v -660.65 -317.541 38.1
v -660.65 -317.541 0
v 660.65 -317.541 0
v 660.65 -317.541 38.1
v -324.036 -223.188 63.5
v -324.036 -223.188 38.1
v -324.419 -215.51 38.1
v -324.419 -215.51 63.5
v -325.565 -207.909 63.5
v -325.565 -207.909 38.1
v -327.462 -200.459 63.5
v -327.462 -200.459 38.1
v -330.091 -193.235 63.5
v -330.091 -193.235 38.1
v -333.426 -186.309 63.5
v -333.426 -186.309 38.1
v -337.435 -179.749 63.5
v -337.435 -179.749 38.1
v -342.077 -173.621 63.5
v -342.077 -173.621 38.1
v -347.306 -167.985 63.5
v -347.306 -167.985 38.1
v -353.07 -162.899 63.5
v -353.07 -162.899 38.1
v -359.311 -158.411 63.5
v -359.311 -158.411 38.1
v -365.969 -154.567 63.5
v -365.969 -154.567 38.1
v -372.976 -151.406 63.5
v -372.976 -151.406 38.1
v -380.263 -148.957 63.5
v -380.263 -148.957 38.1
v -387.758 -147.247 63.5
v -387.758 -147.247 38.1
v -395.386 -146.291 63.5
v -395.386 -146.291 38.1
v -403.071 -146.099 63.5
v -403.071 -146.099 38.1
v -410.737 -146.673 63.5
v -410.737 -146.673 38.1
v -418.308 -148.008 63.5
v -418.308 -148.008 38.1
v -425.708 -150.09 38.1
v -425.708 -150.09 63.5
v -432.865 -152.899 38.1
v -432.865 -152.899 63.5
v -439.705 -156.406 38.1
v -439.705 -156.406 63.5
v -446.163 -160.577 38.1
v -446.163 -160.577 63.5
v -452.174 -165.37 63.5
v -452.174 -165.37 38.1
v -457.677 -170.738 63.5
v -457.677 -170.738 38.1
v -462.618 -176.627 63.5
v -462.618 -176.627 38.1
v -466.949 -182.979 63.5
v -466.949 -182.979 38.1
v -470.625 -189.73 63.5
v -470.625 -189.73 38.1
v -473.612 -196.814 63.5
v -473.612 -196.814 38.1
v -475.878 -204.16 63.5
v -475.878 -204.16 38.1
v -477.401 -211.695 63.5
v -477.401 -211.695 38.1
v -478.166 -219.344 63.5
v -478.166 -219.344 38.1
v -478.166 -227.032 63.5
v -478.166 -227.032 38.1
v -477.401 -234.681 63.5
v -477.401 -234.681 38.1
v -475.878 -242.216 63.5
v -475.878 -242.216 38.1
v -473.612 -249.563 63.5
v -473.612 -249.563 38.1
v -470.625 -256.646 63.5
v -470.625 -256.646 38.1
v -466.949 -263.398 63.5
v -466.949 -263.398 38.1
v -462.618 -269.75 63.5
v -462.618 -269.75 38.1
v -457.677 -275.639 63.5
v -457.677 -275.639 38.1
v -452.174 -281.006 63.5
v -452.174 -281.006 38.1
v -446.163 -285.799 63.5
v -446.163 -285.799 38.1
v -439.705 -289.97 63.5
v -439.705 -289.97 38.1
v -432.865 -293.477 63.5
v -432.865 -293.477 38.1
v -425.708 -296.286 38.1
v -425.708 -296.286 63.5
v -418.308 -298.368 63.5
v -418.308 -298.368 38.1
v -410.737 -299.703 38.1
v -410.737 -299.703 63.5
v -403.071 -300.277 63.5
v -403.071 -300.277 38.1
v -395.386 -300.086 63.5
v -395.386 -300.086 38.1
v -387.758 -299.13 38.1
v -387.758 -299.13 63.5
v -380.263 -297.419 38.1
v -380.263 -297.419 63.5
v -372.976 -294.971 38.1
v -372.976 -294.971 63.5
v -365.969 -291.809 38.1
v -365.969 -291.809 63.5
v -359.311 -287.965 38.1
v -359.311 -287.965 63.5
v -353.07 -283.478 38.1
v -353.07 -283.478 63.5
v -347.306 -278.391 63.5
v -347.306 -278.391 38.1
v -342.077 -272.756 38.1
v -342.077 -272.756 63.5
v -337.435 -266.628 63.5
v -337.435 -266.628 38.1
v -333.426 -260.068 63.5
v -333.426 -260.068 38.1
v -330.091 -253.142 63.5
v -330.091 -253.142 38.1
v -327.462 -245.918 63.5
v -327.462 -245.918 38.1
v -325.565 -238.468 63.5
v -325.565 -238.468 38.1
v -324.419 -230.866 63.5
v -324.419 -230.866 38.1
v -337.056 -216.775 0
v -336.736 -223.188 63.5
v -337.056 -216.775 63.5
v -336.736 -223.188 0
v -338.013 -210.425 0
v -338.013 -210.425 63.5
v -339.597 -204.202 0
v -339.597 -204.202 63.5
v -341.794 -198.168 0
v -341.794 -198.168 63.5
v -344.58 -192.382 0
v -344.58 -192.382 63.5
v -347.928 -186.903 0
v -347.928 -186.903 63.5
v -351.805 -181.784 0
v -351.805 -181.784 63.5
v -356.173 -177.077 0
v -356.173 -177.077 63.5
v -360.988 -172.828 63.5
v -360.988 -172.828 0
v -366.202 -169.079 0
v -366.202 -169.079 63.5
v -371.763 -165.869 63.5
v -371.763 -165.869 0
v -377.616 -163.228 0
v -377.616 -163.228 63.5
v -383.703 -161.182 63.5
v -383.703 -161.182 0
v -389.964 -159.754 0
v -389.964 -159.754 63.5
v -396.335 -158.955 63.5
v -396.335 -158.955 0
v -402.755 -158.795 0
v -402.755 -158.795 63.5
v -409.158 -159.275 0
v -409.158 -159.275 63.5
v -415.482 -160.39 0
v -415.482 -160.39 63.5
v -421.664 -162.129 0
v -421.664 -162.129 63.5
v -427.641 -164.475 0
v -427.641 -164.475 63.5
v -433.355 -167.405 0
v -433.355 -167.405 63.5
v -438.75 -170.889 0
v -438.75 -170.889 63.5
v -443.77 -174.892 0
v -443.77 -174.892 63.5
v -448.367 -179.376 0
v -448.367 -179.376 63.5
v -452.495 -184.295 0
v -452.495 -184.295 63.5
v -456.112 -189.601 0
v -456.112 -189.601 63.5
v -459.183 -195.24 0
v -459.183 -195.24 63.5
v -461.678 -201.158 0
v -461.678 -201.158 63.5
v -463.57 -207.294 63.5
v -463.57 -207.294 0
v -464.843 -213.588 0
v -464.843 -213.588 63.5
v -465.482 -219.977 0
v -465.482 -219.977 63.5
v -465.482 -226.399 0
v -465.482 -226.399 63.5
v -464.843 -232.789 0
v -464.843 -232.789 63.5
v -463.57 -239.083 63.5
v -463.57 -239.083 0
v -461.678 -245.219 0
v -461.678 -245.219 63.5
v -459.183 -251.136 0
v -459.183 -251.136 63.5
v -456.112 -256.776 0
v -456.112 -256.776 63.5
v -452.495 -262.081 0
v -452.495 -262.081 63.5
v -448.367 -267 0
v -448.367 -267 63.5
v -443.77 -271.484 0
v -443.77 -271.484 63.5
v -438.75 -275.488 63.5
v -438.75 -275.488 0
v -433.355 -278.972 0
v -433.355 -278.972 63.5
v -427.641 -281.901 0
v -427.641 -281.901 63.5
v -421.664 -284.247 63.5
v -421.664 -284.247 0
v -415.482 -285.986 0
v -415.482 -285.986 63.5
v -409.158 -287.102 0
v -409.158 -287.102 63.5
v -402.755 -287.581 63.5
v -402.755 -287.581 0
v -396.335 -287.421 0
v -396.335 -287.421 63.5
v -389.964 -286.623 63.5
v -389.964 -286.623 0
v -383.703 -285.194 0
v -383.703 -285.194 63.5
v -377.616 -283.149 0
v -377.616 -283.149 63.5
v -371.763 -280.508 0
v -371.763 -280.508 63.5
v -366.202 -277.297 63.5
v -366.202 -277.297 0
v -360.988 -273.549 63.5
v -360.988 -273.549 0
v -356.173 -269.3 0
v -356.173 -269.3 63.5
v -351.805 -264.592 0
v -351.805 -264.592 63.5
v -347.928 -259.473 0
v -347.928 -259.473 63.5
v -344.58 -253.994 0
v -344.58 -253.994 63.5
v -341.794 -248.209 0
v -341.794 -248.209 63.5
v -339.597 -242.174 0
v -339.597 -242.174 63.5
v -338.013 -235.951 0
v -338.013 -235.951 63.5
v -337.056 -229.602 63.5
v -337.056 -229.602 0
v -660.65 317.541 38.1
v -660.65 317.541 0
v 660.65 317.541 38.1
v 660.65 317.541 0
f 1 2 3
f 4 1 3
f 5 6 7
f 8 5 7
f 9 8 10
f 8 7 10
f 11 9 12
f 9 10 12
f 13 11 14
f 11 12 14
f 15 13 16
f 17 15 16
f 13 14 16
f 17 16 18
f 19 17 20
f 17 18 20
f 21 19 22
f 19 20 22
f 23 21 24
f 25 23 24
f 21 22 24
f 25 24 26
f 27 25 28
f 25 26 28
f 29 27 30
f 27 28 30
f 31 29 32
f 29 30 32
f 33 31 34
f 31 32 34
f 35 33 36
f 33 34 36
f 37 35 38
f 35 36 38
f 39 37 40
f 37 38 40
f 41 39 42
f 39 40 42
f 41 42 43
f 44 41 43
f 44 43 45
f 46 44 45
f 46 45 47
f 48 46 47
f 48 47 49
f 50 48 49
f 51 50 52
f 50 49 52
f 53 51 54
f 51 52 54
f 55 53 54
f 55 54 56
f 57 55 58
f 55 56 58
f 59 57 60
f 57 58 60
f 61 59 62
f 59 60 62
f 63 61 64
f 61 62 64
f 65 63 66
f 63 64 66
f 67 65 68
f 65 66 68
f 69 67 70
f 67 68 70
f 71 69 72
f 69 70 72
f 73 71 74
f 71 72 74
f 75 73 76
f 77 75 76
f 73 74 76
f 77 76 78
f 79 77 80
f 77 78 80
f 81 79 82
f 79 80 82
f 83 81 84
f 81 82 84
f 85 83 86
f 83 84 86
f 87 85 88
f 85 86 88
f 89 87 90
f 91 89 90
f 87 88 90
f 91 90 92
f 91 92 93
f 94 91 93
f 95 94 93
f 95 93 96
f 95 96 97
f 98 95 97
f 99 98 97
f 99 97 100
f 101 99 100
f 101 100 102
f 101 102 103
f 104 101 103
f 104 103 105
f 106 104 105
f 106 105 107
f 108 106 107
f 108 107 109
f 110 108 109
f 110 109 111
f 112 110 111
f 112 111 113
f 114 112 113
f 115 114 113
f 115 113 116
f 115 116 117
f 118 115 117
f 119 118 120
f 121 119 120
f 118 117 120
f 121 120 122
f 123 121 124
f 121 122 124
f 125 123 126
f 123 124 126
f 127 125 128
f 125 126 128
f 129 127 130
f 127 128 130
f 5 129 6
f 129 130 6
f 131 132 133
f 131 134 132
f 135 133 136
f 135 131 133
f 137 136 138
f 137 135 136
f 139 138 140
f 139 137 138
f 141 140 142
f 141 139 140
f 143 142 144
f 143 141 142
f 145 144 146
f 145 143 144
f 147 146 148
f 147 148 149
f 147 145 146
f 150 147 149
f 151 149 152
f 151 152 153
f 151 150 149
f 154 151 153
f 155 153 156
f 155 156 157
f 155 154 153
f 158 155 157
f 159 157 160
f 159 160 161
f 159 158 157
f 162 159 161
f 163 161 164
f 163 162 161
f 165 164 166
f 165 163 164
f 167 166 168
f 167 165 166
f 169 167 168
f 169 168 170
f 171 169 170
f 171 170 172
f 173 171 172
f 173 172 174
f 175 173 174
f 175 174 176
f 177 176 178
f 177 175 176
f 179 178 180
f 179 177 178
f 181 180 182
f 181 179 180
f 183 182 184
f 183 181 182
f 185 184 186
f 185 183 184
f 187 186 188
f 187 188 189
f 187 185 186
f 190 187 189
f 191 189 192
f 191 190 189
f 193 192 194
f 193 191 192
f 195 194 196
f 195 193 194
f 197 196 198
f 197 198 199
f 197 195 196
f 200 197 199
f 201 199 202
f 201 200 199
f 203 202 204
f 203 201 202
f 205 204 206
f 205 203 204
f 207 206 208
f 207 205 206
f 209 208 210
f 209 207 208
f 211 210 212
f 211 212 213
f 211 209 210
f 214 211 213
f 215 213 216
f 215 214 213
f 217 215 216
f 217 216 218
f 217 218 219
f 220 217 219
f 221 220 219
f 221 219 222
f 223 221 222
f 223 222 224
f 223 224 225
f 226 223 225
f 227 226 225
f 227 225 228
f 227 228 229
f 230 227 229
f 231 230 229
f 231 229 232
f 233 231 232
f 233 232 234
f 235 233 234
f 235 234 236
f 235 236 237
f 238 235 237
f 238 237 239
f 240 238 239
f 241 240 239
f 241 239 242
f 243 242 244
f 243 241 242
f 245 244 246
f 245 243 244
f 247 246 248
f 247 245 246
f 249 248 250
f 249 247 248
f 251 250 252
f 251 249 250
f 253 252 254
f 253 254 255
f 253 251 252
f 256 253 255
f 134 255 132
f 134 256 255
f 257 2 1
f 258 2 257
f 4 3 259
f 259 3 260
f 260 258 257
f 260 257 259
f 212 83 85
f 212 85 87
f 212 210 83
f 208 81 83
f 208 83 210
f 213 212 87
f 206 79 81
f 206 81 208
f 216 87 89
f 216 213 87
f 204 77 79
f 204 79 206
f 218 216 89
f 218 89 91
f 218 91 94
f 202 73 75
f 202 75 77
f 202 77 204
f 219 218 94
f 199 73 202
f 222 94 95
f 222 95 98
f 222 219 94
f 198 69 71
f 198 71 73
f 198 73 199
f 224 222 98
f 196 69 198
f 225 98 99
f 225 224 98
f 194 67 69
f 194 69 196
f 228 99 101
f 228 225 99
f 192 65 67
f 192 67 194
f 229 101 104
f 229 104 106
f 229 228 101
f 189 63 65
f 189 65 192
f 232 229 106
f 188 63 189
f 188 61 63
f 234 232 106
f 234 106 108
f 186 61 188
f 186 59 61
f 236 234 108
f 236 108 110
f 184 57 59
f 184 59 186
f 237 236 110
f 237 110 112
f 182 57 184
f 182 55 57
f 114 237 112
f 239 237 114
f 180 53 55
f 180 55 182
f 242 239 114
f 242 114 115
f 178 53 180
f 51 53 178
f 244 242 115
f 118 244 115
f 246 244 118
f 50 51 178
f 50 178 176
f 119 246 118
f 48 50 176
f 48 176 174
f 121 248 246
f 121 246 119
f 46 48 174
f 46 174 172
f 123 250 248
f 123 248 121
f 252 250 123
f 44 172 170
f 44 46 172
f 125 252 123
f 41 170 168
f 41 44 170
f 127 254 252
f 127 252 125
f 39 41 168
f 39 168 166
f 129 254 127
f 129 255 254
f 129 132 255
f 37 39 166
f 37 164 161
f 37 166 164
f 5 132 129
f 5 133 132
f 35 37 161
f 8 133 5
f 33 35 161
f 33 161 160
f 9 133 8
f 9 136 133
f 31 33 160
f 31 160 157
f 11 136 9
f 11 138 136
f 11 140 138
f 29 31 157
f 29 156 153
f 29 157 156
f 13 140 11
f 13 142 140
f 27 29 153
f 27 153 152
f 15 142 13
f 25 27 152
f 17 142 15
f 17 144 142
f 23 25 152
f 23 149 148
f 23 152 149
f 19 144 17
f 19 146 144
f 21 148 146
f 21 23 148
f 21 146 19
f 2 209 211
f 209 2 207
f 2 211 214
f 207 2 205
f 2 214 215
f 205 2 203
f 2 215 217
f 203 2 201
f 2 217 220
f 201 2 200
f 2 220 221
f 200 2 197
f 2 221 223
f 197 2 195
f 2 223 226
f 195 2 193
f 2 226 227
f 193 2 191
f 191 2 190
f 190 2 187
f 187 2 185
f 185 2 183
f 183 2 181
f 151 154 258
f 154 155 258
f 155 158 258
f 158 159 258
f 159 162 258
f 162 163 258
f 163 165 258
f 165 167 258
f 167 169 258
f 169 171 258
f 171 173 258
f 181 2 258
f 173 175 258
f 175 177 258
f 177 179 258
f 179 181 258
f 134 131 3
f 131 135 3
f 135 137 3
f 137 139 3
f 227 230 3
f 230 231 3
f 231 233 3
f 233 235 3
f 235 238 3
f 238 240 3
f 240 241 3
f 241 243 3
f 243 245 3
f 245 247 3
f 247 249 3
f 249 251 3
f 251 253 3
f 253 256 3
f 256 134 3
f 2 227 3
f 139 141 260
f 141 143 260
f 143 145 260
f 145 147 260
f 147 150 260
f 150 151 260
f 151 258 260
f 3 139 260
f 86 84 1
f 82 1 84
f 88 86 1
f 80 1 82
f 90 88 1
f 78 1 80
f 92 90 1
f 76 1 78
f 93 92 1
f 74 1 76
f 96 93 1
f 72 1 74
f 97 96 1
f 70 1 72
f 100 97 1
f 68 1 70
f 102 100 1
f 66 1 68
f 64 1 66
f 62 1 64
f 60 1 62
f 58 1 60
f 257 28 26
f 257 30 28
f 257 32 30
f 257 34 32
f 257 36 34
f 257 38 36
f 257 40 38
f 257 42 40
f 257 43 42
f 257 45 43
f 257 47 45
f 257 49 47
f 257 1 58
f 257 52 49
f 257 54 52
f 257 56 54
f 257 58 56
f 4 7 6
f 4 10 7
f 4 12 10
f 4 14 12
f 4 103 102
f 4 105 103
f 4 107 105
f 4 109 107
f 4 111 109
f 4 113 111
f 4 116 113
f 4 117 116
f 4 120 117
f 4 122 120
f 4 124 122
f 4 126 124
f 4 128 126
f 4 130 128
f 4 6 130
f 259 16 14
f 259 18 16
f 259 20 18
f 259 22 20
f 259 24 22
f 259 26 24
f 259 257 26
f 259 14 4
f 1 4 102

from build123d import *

# Parameters (mm, degrees)
F0_W     = 1321.300506
F0_H     = 635.08135
F0_R     = 64.413244
F1_DEPTH = 38.1
F2_R     = 77.113234
F2_R_2   = 64.413244
F3_DEPTH = 25.4


with BuildPart() as f1:
    # F0 (on Top) → F1 (new body)
    with BuildSketch(Plane.XY):
        Rectangle(F0_W, F0_H)
        with Locations((-401.148856, -223.188221)):
            Circle(F0_R, mode=Mode.SUBTRACT)
    extrude(amount=F1_DEPTH)

    # F2 (on face) → F3 (join)
    with BuildSketch(Plane.XY.offset(38.1)):
        with Locations((-401.148856, -223.188221)):
            Circle(F2_R)
        with Locations((-401.148856, -223.188221)):
            Circle(F2_R_2, mode=Mode.SUBTRACT)
    extrude(amount=F3_DEPTH)


solid = f1.part
